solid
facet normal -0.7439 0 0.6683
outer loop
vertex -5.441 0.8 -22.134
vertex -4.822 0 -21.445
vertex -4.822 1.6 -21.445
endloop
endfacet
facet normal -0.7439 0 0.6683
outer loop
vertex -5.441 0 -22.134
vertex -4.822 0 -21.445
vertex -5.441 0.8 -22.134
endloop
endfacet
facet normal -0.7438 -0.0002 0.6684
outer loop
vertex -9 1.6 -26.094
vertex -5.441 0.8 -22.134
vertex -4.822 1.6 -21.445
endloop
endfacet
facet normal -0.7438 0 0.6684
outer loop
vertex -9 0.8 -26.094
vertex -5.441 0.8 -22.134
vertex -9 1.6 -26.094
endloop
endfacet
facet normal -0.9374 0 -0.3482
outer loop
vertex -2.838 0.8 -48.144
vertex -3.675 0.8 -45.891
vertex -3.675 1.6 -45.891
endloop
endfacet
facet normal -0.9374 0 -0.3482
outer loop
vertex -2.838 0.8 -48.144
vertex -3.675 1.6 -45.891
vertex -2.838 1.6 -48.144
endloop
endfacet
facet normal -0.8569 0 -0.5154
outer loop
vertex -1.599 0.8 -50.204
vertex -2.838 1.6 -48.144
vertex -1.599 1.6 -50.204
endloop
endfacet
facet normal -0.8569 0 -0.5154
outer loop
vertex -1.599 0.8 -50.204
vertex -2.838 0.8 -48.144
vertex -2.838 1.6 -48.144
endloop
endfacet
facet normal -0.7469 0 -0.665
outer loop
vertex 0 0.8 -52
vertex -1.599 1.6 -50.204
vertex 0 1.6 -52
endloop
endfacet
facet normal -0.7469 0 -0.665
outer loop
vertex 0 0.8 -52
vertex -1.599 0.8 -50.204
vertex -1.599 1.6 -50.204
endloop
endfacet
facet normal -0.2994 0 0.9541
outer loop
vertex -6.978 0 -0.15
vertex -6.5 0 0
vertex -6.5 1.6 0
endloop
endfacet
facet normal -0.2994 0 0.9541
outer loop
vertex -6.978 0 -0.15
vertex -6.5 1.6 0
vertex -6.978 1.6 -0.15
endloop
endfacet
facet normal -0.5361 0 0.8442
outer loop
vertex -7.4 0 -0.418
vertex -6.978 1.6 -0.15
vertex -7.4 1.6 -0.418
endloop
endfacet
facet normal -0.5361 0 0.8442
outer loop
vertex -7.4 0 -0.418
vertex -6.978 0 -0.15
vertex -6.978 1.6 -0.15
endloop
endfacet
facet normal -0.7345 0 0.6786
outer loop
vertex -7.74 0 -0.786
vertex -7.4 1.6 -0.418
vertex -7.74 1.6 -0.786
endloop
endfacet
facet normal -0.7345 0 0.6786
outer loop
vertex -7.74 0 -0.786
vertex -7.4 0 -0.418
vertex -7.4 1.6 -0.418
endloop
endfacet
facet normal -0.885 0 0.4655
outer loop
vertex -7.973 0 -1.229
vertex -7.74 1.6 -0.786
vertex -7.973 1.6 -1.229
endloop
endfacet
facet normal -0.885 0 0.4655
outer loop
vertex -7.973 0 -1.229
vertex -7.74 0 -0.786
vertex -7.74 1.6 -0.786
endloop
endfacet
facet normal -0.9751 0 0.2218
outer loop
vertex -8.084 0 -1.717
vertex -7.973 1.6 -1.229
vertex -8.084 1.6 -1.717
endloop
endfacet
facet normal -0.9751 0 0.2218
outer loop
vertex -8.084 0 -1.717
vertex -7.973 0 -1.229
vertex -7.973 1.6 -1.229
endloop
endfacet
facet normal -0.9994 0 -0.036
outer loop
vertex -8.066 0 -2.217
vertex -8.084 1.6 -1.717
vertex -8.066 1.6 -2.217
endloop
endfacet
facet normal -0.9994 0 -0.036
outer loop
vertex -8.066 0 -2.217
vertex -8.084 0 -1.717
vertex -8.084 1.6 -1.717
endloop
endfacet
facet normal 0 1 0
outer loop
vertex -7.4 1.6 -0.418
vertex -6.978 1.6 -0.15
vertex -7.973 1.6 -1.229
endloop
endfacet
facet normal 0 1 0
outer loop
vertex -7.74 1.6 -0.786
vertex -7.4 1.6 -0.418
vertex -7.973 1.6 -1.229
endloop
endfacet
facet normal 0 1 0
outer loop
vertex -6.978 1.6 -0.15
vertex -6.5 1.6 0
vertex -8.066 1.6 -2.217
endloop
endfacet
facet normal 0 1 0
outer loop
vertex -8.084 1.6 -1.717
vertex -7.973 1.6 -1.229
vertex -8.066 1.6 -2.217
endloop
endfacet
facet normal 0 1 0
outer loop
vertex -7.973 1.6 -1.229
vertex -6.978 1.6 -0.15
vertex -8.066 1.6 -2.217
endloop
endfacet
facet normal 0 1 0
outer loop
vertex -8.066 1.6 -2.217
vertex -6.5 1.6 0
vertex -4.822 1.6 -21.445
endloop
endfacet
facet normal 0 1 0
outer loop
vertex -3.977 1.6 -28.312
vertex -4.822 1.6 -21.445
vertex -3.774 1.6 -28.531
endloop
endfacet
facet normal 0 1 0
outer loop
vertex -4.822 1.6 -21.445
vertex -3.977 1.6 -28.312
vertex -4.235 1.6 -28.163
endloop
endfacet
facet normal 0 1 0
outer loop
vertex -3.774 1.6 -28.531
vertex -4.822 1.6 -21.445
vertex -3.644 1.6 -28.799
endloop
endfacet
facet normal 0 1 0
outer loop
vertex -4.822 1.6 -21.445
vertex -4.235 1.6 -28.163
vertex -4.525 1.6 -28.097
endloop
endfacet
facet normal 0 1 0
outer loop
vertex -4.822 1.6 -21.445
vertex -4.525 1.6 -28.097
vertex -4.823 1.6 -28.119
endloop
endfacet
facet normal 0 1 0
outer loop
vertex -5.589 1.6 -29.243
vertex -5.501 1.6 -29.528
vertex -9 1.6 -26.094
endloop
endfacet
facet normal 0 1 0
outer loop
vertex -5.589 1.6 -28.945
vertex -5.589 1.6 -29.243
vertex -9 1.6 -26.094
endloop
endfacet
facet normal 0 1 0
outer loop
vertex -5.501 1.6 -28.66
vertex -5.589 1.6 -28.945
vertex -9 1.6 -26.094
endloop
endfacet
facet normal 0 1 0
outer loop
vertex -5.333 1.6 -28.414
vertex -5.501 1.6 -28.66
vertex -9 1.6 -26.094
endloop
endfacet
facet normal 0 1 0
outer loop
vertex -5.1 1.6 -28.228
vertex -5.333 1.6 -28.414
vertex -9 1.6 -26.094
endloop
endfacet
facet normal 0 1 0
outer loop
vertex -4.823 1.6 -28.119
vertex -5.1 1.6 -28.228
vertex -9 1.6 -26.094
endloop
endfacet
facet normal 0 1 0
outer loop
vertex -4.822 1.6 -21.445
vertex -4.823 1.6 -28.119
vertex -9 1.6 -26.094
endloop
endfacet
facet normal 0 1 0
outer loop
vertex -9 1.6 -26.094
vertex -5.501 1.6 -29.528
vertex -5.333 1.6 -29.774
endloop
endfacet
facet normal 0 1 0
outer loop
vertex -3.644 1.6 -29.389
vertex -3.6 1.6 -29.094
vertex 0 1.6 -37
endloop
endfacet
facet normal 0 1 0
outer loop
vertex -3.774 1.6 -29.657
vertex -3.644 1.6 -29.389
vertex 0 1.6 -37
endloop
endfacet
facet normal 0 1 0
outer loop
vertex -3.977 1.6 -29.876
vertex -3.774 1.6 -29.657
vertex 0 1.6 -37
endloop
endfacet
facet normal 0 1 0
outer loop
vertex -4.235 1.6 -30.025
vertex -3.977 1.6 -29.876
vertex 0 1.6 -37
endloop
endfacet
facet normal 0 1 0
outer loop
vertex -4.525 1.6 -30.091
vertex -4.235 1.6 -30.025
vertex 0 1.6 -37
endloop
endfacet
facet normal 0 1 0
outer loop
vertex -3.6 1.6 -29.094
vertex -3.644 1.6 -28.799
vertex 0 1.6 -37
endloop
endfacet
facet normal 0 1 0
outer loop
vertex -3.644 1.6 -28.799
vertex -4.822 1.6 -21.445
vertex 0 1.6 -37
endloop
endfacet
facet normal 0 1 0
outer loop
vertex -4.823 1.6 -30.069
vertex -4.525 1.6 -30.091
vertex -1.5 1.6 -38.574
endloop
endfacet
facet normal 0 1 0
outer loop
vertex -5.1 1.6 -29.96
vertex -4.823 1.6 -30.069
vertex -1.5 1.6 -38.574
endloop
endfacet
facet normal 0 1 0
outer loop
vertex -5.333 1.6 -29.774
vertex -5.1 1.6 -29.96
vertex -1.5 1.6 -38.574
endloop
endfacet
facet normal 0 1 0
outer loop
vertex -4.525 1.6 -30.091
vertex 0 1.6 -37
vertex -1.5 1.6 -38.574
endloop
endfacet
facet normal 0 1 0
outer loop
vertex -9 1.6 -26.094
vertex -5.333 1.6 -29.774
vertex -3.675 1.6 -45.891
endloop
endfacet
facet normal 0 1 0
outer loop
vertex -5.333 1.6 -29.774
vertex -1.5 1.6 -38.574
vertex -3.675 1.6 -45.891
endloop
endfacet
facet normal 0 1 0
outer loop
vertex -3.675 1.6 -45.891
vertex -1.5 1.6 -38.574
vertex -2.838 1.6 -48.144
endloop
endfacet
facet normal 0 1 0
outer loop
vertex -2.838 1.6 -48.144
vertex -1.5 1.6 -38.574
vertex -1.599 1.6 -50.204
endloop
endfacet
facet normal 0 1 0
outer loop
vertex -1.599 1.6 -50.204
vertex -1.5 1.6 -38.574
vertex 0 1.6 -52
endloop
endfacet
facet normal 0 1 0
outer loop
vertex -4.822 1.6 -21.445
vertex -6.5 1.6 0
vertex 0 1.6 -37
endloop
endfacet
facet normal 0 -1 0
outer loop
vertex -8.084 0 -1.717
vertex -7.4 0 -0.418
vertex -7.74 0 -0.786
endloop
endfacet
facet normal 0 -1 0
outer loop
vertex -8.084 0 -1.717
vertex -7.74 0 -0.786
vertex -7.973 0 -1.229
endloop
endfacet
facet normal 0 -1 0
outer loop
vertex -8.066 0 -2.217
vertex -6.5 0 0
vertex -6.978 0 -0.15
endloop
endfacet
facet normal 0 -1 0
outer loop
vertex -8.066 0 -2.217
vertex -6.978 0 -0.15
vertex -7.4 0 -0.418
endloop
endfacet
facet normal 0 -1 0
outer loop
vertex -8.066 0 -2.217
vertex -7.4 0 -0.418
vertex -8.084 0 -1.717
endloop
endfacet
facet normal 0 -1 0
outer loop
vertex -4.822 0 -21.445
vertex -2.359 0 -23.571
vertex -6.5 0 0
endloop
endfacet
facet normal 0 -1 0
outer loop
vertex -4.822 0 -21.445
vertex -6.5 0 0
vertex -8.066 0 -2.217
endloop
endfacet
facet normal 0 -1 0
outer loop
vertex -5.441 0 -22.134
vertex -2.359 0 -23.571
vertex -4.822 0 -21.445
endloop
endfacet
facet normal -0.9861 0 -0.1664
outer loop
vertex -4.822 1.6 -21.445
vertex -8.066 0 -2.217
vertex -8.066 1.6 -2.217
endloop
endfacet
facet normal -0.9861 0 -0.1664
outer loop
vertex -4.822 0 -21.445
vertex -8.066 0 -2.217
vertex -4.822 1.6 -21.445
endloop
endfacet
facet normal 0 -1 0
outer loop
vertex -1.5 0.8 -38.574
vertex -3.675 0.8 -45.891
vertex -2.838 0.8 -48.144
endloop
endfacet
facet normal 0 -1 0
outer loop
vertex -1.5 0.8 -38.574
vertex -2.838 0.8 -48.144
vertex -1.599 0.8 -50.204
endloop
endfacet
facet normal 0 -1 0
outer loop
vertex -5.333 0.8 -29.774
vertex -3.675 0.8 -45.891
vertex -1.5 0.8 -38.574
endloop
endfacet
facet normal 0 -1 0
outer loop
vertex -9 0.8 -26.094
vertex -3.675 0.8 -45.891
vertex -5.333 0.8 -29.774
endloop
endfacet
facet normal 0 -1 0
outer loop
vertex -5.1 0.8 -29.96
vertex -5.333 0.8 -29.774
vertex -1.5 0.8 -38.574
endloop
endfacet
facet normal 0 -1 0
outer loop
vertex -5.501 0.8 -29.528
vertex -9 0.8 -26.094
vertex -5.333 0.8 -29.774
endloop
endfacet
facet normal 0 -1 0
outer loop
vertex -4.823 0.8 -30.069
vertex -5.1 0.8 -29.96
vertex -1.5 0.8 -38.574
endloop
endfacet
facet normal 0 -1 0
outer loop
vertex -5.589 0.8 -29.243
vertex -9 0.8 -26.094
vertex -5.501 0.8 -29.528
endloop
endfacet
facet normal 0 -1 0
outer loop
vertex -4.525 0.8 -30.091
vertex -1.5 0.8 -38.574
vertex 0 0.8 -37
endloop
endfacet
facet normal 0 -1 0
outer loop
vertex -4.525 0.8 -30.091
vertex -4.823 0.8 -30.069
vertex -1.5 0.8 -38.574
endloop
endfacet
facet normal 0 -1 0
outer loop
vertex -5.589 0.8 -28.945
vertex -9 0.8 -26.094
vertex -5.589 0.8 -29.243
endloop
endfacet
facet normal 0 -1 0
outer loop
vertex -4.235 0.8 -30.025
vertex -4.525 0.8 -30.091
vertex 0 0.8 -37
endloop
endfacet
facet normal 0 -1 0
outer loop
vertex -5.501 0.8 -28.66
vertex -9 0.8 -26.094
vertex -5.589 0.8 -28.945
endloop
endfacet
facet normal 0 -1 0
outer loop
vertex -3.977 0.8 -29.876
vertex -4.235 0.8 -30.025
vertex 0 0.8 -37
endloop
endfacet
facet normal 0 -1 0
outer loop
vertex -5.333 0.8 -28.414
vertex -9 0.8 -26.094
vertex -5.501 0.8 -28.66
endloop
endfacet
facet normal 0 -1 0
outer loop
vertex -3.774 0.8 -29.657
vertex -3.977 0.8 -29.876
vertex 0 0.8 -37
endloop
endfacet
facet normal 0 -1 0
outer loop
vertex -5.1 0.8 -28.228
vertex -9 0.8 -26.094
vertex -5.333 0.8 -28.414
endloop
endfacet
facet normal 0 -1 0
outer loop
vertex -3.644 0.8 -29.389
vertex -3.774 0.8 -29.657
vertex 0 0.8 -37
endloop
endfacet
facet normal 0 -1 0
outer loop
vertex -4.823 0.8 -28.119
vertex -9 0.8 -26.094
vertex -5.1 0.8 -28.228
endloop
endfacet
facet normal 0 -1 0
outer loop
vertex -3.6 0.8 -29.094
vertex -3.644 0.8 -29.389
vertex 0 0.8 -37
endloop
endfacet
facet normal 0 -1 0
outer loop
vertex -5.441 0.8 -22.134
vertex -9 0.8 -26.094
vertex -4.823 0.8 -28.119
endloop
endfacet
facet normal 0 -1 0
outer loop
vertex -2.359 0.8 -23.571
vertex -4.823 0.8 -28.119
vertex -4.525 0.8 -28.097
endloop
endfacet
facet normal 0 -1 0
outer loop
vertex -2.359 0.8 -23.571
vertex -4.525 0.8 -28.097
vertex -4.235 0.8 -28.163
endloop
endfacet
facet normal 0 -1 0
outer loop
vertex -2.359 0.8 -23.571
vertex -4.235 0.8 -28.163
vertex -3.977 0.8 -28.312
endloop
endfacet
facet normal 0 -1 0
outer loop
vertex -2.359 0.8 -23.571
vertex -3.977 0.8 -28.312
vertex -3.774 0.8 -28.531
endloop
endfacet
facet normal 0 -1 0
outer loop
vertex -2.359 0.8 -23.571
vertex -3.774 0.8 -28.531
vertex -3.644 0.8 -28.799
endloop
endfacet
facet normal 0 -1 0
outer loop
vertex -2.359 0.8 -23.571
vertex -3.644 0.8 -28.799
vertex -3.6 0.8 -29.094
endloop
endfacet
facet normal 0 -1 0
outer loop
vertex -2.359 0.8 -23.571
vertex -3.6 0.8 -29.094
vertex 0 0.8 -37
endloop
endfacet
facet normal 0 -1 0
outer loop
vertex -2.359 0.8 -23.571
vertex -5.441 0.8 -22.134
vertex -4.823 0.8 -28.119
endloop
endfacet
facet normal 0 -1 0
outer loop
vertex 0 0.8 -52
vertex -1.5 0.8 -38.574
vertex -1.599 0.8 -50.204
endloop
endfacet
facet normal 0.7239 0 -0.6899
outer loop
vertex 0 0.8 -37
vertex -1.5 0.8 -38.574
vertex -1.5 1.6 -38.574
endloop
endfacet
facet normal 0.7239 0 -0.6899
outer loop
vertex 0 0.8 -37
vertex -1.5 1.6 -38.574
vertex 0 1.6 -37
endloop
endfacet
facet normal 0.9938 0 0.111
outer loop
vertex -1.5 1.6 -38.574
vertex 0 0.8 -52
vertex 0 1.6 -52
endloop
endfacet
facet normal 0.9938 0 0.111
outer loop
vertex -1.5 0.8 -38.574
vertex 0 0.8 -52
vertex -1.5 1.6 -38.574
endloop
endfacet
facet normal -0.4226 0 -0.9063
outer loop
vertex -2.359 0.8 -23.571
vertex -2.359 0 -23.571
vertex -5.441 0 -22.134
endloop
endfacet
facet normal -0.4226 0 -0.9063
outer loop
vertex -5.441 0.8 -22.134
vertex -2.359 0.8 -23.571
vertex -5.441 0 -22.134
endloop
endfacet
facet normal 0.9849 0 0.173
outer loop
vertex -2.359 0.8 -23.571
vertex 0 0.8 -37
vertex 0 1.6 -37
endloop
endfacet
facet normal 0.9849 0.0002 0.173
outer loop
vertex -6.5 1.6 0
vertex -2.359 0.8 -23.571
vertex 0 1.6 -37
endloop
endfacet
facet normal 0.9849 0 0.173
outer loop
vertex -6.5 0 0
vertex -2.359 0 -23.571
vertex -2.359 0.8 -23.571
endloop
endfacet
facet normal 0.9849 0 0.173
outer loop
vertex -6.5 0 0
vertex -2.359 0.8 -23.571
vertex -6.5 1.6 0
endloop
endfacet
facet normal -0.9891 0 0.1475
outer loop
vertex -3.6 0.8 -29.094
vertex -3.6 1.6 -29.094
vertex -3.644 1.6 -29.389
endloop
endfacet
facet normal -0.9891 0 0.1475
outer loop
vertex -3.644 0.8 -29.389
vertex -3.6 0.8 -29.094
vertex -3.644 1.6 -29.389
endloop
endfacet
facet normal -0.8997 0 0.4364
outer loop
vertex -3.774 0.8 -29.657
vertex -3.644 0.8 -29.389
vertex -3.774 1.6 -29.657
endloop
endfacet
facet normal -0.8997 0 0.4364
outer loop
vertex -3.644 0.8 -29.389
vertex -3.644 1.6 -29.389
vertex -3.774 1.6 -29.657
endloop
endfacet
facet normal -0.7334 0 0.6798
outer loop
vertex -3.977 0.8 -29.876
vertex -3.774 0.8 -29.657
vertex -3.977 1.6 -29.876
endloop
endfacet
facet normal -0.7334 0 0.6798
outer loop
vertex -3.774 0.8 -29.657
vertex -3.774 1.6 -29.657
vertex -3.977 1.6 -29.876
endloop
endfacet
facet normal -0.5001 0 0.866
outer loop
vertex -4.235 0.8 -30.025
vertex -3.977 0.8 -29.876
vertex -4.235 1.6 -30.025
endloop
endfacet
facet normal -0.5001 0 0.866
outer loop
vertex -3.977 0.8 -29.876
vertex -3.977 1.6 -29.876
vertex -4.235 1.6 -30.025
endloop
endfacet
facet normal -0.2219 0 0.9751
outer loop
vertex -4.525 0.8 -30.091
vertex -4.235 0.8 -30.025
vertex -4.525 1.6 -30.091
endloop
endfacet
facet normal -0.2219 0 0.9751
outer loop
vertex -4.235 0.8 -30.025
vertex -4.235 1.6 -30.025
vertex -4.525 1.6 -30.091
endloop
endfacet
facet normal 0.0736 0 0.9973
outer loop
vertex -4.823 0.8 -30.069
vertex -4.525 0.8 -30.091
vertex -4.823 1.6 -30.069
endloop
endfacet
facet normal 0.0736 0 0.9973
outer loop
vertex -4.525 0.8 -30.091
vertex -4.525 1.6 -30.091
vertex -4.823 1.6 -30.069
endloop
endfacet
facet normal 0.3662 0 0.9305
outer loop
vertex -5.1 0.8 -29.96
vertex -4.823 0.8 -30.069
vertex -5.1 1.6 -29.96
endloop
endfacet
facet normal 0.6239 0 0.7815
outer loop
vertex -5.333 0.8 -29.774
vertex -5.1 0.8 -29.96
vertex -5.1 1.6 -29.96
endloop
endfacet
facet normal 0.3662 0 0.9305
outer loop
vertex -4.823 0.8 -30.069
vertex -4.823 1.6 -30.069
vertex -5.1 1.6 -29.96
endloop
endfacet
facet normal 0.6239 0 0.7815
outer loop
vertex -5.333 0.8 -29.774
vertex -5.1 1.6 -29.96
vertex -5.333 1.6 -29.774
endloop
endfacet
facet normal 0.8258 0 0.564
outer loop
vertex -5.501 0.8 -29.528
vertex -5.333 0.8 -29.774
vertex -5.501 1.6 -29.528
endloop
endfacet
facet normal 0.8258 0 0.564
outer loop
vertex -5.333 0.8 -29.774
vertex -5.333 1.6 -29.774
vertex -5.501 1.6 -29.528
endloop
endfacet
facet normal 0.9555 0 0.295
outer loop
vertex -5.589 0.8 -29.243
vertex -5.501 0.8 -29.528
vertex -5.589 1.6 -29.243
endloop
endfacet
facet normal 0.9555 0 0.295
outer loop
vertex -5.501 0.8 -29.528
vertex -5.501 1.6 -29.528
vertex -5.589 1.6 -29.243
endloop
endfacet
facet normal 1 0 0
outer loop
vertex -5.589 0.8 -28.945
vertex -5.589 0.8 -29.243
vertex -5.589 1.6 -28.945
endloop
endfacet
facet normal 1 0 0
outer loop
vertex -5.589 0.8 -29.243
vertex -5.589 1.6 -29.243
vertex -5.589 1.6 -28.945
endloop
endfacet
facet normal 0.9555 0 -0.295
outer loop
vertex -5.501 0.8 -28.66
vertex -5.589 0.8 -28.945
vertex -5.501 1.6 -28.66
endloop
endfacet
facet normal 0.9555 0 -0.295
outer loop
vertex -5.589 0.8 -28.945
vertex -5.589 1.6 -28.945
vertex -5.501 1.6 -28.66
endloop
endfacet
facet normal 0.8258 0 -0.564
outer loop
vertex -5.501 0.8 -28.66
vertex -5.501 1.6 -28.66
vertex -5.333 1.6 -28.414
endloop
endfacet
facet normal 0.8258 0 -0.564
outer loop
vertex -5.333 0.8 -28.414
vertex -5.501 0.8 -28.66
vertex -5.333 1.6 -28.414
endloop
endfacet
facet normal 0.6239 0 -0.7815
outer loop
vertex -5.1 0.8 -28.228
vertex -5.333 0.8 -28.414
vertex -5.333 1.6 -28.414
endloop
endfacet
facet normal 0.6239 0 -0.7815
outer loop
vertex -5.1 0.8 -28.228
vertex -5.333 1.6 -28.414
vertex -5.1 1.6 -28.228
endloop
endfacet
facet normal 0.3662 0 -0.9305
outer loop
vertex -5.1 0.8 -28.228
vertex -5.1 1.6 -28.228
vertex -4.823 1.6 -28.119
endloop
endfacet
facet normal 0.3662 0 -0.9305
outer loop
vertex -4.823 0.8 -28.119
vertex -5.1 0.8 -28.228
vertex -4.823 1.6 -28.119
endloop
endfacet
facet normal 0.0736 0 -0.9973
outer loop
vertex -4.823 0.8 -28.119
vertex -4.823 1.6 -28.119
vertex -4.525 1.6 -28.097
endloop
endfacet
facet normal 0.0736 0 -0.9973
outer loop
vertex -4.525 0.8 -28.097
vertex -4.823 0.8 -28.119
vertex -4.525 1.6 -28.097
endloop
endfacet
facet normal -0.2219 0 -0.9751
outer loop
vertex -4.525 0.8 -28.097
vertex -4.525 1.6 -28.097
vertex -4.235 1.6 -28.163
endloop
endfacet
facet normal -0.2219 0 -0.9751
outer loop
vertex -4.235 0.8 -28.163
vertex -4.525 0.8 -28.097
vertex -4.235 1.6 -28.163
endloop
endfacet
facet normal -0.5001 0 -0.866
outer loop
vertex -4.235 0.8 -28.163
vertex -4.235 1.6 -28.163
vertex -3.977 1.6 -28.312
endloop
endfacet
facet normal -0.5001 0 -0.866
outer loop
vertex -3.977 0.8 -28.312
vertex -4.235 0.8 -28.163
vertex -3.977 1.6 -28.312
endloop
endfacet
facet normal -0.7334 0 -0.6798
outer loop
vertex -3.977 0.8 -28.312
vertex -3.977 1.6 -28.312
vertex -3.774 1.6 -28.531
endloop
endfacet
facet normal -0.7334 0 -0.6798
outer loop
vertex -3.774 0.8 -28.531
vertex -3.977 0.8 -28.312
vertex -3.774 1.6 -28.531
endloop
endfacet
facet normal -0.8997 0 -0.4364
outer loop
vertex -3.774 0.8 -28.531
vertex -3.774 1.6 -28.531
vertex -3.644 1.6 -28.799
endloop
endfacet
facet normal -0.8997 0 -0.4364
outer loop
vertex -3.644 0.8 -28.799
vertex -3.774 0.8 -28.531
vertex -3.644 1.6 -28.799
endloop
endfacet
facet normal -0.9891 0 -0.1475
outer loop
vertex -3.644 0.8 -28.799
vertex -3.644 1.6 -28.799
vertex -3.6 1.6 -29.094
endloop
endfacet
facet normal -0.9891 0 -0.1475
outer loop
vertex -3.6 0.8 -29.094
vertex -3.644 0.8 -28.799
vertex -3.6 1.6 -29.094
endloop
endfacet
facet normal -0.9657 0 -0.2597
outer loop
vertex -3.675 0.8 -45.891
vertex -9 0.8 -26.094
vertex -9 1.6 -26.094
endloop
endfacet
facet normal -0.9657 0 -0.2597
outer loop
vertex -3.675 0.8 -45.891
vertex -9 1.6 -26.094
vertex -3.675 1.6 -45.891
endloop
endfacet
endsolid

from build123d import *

# Parameters (mm, degrees)
BOSS_EXTRUDE1_DEPTH = 1.6
SKETCH2_R           = 1
CUT_EXTRUDE1_DEPTH  = 2.6
CUT_EXTRUDE2_DEPTH  = 0.8


with BuildPart() as part:
    # Sketch1 → Boss-Extrude1 (new body)
    with BuildSketch(Plane(origin=(0, 0, 0), x_dir=(1, 0, 0), z_dir=(0, 1, 0))):
        with BuildLine():
            Line((-9, 26.094133447), (-3.675272118, 45.890528901))
            ThreePointArc((-3.675272118, 45.890528901), (-2.266272493, 49.203119101), (0, 52))
            Line((0, 52), (-1.5, 38.573765251))
            Line((-1.5, 38.573765251), (0, 37))
            Line((0, 37), (-6.5, 0))
            ThreePointArc((-6.5, 0), (-7.739867281, 0.785826002), (-8.065788204, 2.217108271))
            Line((-8.065788204, 2.217108271), (-4.822378182, 21.445480314))
            Line((-4.822378182, 21.445480314), (-9, 26.094133447))
        make_face()
    extrude(amount=BOSS_EXTRUDE1_DEPTH)

    # Sketch2 → Cut-Extrude1 (cut, through all)
    with BuildSketch(Plane(origin=(0, 1.6, 0), x_dir=(1, 0, 0), z_dir=(0, 1, 0))):
        with Locations((-4.6, 29.094133447)):
            Circle(SKETCH2_R)
    extrude(amount=-CUT_EXTRUDE1_DEPTH, mode=Mode.SUBTRACT)

    # Sketch4 → Cut-Extrude2 (cut)
    with BuildSketch(Plane.XZ):
        Polygon((-5.441038935, -22.133895727), (-15.455204314, -22.133895727), (-15.455204314, -68.130413952), (6.621463741, -68.130413952), (6.621463741, -27.758733102), align=None)
    extrude(amount=-CUT_EXTRUDE2_DEPTH, mode=Mode.SUBTRACT)


solid = part.part
